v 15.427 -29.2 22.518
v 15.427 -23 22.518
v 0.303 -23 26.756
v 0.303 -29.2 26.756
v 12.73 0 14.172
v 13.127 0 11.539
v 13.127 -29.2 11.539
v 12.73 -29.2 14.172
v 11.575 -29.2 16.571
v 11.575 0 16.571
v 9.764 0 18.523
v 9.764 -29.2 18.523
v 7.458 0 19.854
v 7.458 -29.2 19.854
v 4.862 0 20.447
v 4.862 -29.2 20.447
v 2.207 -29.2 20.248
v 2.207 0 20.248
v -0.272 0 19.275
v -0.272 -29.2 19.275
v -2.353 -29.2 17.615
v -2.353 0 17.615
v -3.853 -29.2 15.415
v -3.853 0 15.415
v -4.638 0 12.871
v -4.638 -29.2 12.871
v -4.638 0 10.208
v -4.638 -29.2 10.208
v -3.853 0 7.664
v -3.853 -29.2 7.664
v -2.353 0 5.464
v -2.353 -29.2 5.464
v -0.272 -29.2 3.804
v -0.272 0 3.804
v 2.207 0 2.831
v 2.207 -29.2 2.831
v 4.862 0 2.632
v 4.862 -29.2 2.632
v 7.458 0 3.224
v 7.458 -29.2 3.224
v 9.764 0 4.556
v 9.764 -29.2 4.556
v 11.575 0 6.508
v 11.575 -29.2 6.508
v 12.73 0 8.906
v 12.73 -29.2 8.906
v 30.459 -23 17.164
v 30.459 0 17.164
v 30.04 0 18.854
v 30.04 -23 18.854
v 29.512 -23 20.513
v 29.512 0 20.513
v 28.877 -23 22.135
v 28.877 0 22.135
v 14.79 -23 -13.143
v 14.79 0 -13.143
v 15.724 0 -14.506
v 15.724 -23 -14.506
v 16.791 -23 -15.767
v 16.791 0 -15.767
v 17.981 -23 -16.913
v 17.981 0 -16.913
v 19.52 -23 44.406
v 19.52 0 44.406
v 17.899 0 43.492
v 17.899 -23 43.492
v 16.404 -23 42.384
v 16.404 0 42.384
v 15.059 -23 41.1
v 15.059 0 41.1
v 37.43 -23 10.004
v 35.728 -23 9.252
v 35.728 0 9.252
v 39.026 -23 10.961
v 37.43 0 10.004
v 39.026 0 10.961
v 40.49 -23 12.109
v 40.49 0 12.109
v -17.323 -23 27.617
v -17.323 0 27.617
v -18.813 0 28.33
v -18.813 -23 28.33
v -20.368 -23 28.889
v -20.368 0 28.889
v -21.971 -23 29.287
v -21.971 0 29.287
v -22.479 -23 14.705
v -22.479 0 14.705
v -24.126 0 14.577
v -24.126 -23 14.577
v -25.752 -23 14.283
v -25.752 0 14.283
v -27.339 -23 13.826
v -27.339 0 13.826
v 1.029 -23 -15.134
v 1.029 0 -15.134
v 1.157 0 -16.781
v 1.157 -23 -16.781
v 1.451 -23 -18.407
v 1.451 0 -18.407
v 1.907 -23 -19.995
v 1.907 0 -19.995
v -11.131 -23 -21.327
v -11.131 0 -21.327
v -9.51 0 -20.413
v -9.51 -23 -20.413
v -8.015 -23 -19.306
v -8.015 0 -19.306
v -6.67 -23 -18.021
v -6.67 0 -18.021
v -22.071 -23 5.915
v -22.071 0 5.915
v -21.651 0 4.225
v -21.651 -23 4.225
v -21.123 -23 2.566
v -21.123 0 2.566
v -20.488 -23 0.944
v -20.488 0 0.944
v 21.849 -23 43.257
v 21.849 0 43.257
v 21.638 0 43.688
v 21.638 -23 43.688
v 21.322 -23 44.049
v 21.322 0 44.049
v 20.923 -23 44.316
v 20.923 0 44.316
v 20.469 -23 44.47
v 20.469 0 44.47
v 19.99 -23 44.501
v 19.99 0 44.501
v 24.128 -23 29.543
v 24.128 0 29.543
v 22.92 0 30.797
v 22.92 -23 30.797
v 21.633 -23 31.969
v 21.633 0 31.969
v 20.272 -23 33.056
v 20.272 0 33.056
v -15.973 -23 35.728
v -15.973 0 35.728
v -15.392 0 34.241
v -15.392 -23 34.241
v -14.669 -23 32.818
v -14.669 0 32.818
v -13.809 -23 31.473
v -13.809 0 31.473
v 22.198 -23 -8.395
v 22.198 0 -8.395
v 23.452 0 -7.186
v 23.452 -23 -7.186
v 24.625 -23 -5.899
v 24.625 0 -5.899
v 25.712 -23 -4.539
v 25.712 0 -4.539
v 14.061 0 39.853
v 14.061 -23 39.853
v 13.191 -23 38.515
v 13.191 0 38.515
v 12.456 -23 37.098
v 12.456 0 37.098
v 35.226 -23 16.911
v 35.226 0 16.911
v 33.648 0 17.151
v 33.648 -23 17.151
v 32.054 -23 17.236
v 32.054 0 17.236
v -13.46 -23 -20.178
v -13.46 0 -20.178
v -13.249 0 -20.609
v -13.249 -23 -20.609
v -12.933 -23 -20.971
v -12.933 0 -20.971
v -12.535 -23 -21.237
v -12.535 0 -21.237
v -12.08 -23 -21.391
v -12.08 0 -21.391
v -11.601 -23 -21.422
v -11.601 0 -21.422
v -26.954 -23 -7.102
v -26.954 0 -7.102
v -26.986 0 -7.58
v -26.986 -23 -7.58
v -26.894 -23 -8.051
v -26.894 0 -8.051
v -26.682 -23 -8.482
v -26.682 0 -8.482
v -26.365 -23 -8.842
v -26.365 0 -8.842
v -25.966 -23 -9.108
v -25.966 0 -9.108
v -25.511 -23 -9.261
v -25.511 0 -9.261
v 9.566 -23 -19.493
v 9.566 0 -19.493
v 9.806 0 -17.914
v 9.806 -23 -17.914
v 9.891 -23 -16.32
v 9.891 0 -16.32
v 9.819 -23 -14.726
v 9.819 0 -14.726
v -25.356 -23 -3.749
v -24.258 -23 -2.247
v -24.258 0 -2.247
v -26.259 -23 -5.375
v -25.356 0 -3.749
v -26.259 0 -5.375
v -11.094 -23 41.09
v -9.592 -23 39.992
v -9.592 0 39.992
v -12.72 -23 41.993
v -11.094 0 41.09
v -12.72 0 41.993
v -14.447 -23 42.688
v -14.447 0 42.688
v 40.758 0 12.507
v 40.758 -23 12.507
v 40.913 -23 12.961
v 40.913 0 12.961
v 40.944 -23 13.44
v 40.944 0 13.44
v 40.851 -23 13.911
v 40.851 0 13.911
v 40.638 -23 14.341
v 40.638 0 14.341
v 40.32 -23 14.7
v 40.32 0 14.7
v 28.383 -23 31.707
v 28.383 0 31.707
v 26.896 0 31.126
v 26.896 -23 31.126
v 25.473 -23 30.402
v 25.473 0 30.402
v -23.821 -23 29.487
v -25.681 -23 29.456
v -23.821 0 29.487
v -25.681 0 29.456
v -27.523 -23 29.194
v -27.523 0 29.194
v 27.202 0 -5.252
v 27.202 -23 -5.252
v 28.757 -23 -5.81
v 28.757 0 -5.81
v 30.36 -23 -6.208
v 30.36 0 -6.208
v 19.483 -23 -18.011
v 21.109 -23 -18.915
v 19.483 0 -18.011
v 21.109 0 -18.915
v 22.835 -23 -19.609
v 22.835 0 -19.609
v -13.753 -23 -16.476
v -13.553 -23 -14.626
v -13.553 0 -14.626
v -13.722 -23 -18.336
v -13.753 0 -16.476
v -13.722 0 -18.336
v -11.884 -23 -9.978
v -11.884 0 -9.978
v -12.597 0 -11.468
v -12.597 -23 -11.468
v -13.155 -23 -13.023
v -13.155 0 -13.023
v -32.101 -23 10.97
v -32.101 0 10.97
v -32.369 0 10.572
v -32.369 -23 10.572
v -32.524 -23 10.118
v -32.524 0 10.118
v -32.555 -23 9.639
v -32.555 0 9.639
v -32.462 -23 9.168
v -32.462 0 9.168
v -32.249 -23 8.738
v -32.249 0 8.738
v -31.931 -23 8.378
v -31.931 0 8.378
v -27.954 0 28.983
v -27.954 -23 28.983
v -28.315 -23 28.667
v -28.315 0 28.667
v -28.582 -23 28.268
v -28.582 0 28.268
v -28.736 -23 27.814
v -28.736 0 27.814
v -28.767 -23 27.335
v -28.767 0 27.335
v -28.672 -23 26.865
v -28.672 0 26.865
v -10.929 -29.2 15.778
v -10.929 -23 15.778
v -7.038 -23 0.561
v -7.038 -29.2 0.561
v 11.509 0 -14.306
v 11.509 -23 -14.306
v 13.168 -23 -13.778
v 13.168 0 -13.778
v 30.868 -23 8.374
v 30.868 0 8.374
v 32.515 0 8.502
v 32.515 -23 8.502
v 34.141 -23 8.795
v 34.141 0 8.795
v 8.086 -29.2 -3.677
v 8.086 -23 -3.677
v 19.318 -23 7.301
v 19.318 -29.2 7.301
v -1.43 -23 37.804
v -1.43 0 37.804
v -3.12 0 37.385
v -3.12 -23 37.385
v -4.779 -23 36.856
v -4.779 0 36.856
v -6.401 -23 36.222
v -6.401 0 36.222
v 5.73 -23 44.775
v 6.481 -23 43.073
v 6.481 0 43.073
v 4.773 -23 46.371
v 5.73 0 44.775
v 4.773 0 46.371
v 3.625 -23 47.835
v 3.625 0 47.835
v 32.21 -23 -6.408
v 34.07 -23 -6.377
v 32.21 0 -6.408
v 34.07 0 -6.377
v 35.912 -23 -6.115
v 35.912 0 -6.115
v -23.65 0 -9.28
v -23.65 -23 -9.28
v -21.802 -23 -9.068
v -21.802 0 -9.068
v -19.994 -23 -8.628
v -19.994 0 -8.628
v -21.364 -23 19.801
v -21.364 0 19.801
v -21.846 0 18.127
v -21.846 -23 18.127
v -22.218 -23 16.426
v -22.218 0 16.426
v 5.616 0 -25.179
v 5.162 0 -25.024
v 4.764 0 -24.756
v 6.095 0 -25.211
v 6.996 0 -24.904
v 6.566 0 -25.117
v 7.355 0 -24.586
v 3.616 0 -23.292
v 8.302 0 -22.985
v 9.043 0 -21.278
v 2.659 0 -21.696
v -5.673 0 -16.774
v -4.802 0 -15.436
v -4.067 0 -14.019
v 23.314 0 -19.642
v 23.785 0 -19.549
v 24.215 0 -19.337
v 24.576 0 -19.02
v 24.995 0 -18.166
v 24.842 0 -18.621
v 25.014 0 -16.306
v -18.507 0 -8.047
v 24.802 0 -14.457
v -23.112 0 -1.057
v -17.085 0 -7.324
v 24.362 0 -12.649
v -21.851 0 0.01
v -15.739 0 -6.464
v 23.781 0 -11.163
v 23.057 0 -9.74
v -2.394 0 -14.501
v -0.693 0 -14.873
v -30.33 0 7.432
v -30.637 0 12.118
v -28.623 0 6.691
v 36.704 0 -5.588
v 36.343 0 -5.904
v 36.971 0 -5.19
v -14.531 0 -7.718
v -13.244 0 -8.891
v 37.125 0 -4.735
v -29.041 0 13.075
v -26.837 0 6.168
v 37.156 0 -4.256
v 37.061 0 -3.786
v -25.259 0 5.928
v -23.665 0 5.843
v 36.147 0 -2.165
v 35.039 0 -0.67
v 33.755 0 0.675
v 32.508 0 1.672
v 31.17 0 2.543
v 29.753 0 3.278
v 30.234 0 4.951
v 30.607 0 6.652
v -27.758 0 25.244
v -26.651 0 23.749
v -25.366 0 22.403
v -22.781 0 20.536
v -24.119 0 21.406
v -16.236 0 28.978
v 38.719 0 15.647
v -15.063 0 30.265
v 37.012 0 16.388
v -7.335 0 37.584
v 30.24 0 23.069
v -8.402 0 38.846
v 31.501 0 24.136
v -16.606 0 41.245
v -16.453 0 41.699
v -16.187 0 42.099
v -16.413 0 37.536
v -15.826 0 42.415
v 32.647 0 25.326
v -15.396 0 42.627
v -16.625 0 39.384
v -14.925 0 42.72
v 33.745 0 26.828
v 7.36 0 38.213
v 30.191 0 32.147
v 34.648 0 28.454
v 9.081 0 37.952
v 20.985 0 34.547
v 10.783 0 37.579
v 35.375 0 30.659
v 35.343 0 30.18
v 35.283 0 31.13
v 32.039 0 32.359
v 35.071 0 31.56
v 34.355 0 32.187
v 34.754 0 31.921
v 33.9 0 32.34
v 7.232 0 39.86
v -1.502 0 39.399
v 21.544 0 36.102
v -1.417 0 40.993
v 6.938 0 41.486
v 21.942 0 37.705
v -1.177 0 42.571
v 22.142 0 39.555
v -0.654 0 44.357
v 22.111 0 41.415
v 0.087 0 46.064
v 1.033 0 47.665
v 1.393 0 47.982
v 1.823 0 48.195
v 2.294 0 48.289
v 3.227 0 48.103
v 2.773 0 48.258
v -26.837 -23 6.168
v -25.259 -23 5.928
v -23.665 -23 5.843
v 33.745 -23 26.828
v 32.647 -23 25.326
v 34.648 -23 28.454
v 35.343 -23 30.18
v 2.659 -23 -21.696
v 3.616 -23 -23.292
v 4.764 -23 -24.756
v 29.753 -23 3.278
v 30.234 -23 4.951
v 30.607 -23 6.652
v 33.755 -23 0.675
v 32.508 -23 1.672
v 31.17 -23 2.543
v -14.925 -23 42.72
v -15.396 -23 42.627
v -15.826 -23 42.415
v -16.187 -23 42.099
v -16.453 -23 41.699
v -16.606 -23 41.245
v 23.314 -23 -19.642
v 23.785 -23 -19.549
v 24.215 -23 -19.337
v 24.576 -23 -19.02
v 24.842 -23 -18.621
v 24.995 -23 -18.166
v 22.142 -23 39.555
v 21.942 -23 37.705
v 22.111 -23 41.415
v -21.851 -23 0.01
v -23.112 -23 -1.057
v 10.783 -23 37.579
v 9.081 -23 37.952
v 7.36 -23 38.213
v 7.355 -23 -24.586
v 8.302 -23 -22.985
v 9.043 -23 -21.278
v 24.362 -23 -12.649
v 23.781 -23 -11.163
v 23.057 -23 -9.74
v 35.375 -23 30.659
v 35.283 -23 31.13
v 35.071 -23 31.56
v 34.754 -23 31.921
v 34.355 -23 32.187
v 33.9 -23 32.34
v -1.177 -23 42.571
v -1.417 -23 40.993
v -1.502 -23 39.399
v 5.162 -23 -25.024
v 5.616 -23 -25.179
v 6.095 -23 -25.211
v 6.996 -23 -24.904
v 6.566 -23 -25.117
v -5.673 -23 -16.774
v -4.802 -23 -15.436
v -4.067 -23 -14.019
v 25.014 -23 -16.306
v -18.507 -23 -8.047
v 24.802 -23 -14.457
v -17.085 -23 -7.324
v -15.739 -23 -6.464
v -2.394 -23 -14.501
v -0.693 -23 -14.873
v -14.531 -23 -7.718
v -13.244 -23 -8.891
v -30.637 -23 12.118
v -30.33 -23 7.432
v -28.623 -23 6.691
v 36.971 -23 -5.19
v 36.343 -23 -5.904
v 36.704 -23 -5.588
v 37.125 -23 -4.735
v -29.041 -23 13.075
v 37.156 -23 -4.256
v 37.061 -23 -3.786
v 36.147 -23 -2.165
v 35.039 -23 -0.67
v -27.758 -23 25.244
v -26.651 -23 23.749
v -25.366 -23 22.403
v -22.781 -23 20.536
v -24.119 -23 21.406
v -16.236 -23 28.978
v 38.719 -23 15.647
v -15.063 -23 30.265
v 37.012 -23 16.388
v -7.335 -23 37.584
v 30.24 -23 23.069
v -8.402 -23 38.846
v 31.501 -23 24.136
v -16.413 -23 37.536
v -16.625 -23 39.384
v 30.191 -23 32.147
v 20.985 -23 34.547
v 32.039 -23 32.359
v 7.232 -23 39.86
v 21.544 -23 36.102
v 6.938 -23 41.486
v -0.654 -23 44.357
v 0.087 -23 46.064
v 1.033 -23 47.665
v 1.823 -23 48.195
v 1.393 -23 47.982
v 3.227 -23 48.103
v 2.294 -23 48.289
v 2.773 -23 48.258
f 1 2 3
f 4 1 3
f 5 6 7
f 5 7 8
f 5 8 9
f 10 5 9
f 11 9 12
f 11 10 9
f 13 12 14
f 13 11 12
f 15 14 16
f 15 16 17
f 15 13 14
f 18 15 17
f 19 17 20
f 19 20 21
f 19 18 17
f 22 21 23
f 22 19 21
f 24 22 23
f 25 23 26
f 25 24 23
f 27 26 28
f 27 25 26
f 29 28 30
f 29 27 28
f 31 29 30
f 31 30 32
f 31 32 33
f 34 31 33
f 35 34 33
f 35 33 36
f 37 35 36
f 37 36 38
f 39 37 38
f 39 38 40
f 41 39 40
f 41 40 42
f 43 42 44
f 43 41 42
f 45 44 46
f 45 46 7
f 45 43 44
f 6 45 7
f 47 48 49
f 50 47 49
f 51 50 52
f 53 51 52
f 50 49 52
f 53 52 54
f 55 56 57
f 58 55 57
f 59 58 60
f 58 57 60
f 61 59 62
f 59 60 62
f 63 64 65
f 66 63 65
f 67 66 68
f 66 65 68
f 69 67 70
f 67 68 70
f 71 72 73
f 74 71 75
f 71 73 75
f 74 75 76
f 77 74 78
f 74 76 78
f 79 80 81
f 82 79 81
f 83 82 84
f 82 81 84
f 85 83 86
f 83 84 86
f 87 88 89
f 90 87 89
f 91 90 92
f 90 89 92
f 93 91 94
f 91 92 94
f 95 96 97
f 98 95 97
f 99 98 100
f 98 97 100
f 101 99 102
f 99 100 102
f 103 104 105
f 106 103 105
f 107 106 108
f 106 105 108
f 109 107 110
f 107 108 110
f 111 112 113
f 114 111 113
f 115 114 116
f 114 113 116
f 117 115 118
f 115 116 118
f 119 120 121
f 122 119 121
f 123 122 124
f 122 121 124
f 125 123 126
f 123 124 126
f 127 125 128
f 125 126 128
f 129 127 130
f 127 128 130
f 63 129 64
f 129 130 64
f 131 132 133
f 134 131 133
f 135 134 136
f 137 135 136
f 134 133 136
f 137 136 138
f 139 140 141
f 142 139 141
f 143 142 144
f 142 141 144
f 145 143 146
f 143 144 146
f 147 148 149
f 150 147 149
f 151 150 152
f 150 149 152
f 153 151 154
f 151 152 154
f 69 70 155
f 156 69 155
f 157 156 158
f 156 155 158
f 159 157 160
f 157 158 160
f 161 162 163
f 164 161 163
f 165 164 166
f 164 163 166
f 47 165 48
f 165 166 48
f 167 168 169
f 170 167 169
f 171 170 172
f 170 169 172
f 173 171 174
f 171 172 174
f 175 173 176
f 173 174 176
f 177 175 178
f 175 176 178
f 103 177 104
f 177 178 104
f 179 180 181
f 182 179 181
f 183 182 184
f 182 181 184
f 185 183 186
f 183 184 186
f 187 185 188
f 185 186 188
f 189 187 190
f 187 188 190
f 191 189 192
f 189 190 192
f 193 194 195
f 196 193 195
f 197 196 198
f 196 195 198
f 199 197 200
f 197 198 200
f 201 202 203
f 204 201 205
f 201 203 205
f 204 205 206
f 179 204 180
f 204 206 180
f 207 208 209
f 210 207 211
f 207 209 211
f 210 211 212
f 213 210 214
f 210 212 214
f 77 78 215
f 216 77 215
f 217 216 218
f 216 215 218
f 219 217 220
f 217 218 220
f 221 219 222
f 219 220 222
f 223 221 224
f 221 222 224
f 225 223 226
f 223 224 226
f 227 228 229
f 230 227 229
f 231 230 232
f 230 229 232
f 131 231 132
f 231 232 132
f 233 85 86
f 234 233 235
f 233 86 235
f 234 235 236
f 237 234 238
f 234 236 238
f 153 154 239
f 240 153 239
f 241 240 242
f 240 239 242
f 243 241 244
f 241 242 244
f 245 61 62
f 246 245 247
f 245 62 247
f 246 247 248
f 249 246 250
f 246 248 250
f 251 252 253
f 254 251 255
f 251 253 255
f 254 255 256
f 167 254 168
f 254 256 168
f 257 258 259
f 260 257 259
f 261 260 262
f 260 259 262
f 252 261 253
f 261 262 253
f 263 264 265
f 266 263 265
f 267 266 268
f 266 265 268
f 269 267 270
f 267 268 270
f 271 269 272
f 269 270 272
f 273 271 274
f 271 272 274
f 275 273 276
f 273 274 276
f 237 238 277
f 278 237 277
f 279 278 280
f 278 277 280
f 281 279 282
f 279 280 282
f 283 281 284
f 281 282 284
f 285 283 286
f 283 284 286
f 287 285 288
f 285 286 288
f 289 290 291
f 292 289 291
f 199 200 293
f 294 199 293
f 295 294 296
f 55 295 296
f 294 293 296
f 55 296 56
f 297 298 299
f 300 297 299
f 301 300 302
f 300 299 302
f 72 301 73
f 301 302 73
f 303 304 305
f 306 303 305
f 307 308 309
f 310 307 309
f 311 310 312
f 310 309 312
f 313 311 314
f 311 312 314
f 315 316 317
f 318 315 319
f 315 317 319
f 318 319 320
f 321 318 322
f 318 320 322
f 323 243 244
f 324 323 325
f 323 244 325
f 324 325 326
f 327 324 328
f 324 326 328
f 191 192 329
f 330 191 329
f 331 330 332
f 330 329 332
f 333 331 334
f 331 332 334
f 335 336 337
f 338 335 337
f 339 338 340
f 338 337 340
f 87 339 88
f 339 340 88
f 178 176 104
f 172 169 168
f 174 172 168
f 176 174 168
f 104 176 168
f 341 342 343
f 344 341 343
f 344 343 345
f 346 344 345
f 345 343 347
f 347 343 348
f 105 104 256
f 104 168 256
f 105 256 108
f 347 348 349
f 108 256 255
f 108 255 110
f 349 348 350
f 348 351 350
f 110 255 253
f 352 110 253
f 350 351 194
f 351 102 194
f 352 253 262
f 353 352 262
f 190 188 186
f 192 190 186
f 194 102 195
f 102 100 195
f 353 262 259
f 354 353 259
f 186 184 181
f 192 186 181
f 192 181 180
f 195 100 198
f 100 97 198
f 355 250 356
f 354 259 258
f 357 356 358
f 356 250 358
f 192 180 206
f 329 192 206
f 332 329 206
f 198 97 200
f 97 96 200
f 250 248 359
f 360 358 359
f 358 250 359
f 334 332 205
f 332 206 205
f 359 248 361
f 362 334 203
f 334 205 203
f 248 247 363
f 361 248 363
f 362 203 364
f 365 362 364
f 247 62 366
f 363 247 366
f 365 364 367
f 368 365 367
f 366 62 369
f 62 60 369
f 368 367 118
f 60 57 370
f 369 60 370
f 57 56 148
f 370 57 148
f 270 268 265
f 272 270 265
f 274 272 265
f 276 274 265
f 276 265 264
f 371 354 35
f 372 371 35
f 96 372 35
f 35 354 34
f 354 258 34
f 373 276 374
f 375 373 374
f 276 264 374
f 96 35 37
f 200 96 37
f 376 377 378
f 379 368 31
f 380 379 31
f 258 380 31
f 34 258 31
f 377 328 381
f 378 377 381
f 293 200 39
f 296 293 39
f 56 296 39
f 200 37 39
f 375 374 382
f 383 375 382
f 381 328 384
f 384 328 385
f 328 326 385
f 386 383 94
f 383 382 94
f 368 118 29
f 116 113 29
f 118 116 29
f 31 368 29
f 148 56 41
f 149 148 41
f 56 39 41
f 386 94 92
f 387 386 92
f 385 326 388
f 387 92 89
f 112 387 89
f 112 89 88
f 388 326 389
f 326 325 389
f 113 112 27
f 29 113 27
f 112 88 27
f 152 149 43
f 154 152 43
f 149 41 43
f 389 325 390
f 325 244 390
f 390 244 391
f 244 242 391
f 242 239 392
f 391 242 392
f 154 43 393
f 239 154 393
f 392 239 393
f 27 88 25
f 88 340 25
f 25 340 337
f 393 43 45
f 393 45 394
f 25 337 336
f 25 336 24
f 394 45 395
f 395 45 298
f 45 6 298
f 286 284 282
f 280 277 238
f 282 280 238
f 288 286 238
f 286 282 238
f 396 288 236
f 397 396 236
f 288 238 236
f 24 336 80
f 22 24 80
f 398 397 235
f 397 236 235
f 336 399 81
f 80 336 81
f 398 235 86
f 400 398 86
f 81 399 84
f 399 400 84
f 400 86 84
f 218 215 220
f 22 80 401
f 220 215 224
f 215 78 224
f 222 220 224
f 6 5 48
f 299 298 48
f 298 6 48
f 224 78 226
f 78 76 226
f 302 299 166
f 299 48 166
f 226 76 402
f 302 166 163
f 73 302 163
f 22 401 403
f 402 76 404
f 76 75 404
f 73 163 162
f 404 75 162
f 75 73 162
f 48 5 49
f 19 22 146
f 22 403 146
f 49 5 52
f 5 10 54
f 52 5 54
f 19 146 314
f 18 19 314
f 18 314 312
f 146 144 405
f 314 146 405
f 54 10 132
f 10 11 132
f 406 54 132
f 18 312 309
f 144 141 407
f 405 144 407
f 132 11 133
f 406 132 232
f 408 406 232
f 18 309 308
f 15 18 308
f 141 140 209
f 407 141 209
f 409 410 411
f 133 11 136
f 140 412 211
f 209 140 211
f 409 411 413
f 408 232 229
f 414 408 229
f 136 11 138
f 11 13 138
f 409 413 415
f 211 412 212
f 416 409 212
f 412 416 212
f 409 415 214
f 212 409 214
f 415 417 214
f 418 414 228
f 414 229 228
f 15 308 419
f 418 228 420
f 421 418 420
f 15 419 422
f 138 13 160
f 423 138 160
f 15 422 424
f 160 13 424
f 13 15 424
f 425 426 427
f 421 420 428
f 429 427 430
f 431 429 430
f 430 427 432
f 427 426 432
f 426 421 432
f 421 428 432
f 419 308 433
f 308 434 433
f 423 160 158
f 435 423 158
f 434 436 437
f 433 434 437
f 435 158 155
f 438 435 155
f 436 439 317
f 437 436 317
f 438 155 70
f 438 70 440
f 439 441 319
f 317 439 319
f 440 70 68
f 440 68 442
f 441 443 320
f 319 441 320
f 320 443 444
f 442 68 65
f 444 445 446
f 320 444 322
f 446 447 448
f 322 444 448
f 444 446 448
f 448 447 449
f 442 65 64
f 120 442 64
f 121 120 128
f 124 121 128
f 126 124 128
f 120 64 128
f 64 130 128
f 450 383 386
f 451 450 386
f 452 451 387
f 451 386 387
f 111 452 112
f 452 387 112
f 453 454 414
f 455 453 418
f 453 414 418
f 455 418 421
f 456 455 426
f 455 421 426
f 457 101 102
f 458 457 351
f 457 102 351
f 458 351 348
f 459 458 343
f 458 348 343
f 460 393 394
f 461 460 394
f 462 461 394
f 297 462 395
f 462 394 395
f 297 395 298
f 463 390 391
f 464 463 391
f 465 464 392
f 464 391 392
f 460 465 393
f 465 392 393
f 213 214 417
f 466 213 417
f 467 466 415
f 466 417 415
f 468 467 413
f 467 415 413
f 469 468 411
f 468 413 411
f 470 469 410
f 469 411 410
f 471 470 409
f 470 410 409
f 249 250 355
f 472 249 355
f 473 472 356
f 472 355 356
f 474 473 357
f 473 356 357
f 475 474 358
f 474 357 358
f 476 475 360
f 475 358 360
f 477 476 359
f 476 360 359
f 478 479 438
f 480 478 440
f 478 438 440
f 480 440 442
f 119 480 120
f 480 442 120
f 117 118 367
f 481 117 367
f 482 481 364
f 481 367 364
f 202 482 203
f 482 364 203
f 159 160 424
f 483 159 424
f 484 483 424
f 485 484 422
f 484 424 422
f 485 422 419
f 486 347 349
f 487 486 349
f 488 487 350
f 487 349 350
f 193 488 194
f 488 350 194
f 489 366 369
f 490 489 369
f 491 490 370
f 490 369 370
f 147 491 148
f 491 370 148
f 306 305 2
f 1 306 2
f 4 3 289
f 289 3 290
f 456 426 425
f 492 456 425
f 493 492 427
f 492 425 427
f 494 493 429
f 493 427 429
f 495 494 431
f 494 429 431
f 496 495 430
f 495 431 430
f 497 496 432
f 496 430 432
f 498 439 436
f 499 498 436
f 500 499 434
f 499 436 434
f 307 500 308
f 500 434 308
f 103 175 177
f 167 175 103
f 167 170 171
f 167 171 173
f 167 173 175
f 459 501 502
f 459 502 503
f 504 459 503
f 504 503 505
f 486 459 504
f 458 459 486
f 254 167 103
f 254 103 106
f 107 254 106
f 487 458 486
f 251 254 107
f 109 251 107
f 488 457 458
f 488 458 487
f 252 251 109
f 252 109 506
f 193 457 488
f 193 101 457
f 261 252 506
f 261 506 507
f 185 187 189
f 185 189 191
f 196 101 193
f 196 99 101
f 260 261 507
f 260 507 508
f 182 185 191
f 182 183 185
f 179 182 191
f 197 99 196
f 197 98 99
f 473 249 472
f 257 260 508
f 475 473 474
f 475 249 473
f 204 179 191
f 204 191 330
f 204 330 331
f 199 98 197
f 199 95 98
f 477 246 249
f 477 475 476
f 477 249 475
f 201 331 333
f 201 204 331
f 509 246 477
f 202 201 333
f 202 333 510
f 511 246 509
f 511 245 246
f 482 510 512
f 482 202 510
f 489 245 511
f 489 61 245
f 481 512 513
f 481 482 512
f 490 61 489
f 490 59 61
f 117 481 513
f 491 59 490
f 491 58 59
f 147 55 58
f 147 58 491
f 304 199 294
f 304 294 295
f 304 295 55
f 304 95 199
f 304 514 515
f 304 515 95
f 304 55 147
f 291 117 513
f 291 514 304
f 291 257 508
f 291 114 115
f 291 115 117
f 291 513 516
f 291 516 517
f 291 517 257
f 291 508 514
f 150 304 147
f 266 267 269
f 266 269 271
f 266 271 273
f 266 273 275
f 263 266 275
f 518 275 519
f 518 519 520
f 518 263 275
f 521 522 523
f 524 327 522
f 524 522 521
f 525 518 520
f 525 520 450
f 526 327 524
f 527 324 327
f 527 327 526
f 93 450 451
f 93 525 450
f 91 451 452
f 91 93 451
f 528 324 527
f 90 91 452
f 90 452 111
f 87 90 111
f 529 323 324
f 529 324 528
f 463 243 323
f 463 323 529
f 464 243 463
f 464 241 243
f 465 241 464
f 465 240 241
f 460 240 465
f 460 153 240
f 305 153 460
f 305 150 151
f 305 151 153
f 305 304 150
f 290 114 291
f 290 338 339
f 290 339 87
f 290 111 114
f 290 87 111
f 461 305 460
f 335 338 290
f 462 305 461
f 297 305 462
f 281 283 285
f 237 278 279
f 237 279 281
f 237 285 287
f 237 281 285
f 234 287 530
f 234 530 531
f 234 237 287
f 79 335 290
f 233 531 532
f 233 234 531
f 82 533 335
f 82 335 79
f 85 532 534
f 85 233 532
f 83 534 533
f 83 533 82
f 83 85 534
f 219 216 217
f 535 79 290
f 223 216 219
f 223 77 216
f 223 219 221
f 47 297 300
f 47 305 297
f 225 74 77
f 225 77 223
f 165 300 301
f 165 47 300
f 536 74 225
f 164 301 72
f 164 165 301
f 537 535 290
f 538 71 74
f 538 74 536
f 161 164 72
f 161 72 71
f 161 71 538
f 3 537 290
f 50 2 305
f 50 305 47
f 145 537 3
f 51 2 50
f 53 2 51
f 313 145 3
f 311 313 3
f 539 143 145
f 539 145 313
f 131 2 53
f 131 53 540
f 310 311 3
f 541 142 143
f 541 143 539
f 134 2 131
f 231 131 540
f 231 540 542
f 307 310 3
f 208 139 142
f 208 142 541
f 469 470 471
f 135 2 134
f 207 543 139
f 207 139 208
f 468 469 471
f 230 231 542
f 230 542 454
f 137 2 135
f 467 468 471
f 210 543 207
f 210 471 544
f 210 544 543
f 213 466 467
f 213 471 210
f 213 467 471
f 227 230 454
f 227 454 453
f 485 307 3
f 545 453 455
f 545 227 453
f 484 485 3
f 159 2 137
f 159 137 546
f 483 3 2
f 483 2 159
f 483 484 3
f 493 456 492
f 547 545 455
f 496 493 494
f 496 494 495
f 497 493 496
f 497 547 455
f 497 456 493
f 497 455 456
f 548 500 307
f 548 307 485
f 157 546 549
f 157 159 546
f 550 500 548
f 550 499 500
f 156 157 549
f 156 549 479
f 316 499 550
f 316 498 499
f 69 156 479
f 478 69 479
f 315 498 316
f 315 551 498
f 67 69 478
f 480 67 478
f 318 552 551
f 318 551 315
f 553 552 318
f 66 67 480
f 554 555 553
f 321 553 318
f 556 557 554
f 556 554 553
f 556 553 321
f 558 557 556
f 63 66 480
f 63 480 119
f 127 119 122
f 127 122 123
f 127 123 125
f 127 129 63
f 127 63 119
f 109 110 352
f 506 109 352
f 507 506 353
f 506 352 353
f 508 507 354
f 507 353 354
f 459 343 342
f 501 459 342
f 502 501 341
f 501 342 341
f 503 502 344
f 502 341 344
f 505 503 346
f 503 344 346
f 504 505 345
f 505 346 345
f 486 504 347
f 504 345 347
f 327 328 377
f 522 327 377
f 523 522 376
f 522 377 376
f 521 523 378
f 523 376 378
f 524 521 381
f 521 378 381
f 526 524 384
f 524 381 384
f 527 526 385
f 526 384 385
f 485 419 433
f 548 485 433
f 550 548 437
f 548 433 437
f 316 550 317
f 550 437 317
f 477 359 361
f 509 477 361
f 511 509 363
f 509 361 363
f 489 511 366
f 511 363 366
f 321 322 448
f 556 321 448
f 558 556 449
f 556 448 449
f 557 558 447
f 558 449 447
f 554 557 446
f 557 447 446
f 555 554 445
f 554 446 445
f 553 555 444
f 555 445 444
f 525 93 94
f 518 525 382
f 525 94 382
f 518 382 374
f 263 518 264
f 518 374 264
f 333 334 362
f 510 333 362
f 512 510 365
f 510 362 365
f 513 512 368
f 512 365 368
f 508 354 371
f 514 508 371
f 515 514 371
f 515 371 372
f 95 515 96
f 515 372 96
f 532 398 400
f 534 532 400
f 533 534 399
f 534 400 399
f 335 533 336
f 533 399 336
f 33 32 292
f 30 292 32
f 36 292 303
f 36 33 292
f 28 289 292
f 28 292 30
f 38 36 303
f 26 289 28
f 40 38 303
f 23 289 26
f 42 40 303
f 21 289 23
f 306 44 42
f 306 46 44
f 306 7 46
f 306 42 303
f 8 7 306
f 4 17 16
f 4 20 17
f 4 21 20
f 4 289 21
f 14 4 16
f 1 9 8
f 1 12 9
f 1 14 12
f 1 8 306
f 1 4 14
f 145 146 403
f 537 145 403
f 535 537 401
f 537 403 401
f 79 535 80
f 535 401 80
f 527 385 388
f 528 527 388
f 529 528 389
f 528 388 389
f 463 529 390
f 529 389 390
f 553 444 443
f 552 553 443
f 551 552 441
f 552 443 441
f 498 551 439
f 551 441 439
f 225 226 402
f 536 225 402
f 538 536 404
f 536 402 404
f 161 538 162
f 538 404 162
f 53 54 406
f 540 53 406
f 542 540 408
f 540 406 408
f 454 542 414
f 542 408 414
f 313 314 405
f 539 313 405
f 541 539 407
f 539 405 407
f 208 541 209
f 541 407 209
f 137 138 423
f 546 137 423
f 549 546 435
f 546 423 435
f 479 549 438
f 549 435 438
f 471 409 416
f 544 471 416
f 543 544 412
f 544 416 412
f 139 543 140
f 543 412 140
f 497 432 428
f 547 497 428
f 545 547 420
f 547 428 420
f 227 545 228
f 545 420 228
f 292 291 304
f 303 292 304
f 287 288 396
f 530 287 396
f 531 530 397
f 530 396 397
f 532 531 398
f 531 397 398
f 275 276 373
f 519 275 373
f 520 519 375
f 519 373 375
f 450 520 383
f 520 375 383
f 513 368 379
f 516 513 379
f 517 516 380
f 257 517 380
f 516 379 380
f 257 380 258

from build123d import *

# Parameters (mm, degrees)
F1_DEPTH = 23
F2_COUNT = 12
F0_R     = 8.9323365914
F3_DEPTH = 29.2


with BuildPart() as f1:
    # F0 (on Front) → F1 (new body)
    with BuildSketch(Plane.XZ):
        with BuildLine():
            ThreePointArc((-1.430105941, 37.8043599743), (2.9480264381, 38.3709128978), (7.3598275006, 38.21268291))
            ThreePointArc((7.3598275006, 38.21268291), (7.1059115447, 40.6764495808), (6.4814269965, 43.0732471463))
            ThreePointArc((6.4814269965, 43.0732471463), (5.2761037826, 45.5878183542), (3.6249864327, 47.8349685287))
            ThreePointArc((3.6249864327, 47.8349685287), (2.2938527312, 48.2892841606), (1.0334071525, 47.6651074485))
            ThreePointArc((1.0334071525, 47.6651074485), (-0.310272704, 45.2216678947), (-1.1770668058, 42.5712829425))
            ThreePointArc((-1.1770668058, 42.5712829425), (-1.4791386758, 40.1971401747), (-1.430105941, 37.8043599743))
        make_face()
        with BuildLine():
            ThreePointArc((-1.430105941, 37.8043599743), (-12.6935408321, -9.348025826), (31.0549458343, 11.5393475513))
            ThreePointArc((31.0549458343, 11.5393475513), (24.2756583786, 29.3783879684), (7.3598275006, 38.21268291))
            ThreePointArc((7.3598275006, 38.21268291), (2.9480264381, 38.3709128978), (-1.430105941, 37.8043599743))
        make_face()
        Polygon((0.3031889381, 26.7559829898), (15.426810236, 22.5175925953), (19.3180671322, 7.3009571569), (8.0857027305, -3.6772878871), (-7.0379185674, 0.5611025073), (-10.9291754636, 15.7777379458), align=None, mode=Mode.SUBTRACT)
    extrude(amount=F1_DEPTH)

    # F2: F1 ×12 about axis
    f2_axis = Axis((4.1944458343, 0, 11.5393475513), (0, 1, 0))


with BuildPart() as f1_1:
    add(f1.part)
    for i in range(1, F2_COUNT):
        add(f1.part.rotate(f2_axis, i * 360 / F2_COUNT))

    # F0 (on Front) → F3 (join)
    with BuildSketch(Plane.XZ):
        Polygon((19.3180671322, 7.3009571569), (15.426810236, 22.5175925953), (0.3031889381, 26.7559829898), (-10.9291754636, 15.7777379458), (-7.0379185674, 0.5611025073), (8.0857027305, -3.6772878871), align=None)
        with Locations((4.1944458343, 11.5393475513)):
            Circle(F0_R, mode=Mode.SUBTRACT)
    extrude(amount=F3_DEPTH)


solid = f1_1.part
